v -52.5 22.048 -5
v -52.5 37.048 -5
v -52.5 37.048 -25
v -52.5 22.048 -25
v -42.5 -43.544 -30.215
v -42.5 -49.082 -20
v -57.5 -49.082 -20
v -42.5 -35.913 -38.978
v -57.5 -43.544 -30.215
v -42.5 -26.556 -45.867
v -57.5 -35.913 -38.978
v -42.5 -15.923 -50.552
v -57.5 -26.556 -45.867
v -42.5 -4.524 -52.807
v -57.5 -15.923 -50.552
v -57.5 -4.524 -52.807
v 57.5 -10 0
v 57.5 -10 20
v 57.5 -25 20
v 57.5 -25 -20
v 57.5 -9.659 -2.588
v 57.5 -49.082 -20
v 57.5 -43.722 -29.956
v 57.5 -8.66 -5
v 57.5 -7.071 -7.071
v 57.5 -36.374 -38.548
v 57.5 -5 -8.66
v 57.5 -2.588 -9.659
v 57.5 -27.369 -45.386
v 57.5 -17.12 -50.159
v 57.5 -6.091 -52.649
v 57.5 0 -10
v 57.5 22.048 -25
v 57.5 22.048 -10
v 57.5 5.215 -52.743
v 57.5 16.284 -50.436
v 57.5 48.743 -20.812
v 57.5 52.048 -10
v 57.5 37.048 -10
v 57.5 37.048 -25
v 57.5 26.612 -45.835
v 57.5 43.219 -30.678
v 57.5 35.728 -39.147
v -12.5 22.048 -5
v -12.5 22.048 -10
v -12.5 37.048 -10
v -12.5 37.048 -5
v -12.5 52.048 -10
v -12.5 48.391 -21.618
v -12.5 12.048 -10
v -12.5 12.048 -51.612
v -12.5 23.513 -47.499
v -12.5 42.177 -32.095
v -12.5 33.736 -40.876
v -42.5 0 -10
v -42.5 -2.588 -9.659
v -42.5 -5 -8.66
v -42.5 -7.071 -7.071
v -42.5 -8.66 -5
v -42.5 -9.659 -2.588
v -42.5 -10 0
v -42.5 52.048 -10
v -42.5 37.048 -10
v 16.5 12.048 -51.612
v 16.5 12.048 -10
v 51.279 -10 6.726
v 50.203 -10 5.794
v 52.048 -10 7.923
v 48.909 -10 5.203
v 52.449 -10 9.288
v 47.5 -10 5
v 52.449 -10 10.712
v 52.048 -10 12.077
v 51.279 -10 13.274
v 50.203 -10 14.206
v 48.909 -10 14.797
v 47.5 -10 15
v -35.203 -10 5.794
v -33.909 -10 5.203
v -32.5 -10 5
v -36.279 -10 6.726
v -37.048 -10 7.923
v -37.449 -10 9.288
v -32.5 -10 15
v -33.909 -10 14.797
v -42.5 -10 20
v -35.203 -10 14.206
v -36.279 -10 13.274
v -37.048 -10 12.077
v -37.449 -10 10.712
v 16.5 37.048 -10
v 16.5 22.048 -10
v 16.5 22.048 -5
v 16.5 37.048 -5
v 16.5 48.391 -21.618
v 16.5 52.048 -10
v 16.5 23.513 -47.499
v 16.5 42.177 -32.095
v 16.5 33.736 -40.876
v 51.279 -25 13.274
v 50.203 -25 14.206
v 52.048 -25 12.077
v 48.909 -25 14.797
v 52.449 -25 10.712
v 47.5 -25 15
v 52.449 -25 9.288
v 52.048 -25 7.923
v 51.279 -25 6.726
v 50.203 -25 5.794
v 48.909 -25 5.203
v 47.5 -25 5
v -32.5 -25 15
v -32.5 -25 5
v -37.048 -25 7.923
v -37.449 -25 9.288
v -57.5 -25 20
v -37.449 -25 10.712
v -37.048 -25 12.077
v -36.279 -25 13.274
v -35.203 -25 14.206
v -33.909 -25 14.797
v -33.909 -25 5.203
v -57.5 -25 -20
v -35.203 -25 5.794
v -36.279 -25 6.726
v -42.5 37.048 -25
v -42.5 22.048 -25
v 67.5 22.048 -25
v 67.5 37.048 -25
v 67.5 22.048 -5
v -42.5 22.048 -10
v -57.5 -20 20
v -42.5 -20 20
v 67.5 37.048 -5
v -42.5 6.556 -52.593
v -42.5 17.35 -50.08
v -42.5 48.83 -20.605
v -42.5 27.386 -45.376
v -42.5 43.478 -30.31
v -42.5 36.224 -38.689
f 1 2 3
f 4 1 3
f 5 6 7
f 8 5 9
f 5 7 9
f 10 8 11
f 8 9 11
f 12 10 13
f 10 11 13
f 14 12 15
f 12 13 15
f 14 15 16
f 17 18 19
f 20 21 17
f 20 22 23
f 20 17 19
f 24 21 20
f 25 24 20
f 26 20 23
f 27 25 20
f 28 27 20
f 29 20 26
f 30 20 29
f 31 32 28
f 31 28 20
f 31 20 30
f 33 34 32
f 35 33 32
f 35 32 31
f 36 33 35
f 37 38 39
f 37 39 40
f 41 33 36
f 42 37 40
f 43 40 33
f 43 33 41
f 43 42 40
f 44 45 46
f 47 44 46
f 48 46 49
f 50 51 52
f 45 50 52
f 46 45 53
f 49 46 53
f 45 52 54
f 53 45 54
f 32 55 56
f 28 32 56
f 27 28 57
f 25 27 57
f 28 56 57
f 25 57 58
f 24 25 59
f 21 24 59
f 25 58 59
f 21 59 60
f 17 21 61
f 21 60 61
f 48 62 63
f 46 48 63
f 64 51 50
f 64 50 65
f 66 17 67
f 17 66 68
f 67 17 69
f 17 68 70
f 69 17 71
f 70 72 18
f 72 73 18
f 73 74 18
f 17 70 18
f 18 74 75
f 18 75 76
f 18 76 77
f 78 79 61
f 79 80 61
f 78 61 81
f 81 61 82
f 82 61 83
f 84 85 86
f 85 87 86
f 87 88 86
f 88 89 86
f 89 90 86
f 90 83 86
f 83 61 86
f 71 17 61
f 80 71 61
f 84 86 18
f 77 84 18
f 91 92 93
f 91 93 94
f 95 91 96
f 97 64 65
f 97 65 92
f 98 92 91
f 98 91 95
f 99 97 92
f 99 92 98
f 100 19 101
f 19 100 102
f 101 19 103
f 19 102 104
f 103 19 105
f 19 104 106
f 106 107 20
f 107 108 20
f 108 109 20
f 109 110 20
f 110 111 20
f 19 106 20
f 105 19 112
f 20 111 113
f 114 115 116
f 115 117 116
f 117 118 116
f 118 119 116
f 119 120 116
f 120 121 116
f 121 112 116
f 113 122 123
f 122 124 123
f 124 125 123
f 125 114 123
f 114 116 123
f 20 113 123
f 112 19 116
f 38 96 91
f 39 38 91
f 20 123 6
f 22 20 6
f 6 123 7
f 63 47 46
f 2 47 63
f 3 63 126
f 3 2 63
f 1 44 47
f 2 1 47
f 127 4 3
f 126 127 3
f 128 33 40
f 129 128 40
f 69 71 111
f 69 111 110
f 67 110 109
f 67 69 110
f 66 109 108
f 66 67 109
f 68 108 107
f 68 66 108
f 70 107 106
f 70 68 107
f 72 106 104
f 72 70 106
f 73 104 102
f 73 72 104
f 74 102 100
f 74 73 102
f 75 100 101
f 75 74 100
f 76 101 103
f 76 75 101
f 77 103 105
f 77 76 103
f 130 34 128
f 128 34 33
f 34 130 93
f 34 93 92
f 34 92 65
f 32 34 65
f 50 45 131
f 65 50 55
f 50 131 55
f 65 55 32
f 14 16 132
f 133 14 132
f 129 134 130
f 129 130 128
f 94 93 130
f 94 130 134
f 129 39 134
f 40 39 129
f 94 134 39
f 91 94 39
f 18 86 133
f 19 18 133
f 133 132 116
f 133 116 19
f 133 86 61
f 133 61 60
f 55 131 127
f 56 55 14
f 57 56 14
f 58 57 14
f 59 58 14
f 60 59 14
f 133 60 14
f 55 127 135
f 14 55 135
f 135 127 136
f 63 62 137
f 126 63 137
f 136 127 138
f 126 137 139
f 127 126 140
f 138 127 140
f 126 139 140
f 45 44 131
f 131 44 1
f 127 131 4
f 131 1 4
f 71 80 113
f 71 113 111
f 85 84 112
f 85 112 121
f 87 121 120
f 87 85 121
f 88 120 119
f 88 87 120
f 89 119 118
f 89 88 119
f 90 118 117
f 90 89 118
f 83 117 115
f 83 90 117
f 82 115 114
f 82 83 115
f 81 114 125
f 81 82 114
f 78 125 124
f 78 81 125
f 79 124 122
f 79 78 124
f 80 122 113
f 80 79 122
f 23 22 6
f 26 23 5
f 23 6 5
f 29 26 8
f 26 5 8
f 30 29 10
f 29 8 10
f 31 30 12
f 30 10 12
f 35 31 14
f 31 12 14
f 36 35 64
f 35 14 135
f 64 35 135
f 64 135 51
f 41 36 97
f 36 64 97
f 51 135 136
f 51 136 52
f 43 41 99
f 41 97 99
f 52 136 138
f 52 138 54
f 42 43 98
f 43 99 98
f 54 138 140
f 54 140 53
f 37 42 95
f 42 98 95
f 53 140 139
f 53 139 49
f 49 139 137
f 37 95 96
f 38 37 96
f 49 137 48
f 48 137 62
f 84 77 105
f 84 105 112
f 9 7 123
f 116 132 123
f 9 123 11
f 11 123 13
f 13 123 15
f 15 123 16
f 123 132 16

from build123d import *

# Parameters (mm, degrees)
BOSS_EXTRUDE1_DEPTH      = 57.5
BOSS_EXTRUDE1_DEPTH_BACK = 42.5
BOSS_EXTRUDE2_DEPTH      = 67.5
BOSS_EXTRUDE2_DEPTH_BACK = 52.5
SKETCH2_W                = 20
SKETCH2_H                = 15
BOSS_EXTRUDE3_START      = 15
BOSS_EXTRUDE3_DEPTH      = 15
CUT_EXTRUDE1_DEPTH       = 106.901893724
CUT_EXTRUDE2_DEPTH       = 101.370563414
CUT_EXTRUDE2_DEPTH_BACK  = 101.370563414
SKETCH5_W                = 29
SKETCH5_H                = 40


with BuildPart() as part:
    # Sketch1 → Boss-Extrude1 (new, two sides: drawn at the far end of the back side and taken through both)
    with BuildSketch(Plane(origin=(0, 0, 0), x_dir=(0, 0, -1), z_dir=(1, 0, 0)).offset(-BOSS_EXTRUDE1_DEPTH_BACK)):
        with BuildLine():
            Line((0, -10), (-20, -10))
            Line((-20, -10), (-20, -25))
            Line((-20, -25), (20, -25))
            Line((20, -25), (20, -49.081564767))
            ThreePointArc((20, -49.081564767), (52.742771868, 5.215363425), (10, 52.048054719))
            Line((10, 52.048054719), (10, 0))
            ThreePointArc((10, 0), (7.071067812, -7.071067812), (0, -10))
        make_face()
    extrude(amount=BOSS_EXTRUDE1_DEPTH + BOSS_EXTRUDE1_DEPTH_BACK)

    # Sketch2 → Boss-Extrude2 (add, two sides: drawn at the far end of the back side and taken through both)
    with BuildSketch(Plane(origin=(0, 0, 0), x_dir=(0, 0, -1), z_dir=(1, 0, 0)).offset(-BOSS_EXTRUDE2_DEPTH_BACK)):
        with Locations((15, 29.548054719)):
            Rectangle(SKETCH2_W, SKETCH2_H)
    extrude(amount=BOSS_EXTRUDE2_DEPTH + BOSS_EXTRUDE2_DEPTH_BACK)

    # Sketch3 → Boss-Extrude3 (add)
    with BuildSketch(Plane.ZY.offset(42.5).offset(BOSS_EXTRUDE3_START)):
        with BuildLine():
            Line((20, -25), (-20, -25))
            Line((-20, -25), (-20, -49.081564767))
            ThreePointArc((-20, -49.081564767), (-42.679392836, -31.424026273), (-52.80652364, -4.524495668))
            Line((-52.80652364, -4.524495668), (20, -20))
            Line((20, -20), (20, -25))
        make_face()
    extrude(amount=-BOSS_EXTRUDE3_DEPTH)

    # Sketch4 → Cut-Extrude1 (cut, through all)
    with BuildSketch(Plane(origin=(0, -10, 0), x_dir=(1, 0, 0), z_dir=(0, 1, 0))):
        with BuildLine():
            Line((-32.5, -5), (47.5, -5))
            ThreePointArc((47.5, -5), (52.5, -10), (47.5, -15))
            Line((47.5, -15), (-32.5, -15))
            ThreePointArc((-32.5, -15), (-37.5, -10), (-32.5, -5))
        make_face()
    extrude(amount=-CUT_EXTRUDE1_DEPTH, mode=Mode.SUBTRACT)

    # Sketch5 → Cut-Extrude2 (cut, two sides: drawn at the far end of the back side and taken through both)
    with BuildSketch(Plane.XY.offset(-CUT_EXTRUDE2_DEPTH_BACK)):
        with Locations((2, 32.048054719)):
            Rectangle(SKETCH5_W, SKETCH5_H)
    extrude(amount=CUT_EXTRUDE2_DEPTH + CUT_EXTRUDE2_DEPTH_BACK, mode=Mode.SUBTRACT)


solid = part.part
